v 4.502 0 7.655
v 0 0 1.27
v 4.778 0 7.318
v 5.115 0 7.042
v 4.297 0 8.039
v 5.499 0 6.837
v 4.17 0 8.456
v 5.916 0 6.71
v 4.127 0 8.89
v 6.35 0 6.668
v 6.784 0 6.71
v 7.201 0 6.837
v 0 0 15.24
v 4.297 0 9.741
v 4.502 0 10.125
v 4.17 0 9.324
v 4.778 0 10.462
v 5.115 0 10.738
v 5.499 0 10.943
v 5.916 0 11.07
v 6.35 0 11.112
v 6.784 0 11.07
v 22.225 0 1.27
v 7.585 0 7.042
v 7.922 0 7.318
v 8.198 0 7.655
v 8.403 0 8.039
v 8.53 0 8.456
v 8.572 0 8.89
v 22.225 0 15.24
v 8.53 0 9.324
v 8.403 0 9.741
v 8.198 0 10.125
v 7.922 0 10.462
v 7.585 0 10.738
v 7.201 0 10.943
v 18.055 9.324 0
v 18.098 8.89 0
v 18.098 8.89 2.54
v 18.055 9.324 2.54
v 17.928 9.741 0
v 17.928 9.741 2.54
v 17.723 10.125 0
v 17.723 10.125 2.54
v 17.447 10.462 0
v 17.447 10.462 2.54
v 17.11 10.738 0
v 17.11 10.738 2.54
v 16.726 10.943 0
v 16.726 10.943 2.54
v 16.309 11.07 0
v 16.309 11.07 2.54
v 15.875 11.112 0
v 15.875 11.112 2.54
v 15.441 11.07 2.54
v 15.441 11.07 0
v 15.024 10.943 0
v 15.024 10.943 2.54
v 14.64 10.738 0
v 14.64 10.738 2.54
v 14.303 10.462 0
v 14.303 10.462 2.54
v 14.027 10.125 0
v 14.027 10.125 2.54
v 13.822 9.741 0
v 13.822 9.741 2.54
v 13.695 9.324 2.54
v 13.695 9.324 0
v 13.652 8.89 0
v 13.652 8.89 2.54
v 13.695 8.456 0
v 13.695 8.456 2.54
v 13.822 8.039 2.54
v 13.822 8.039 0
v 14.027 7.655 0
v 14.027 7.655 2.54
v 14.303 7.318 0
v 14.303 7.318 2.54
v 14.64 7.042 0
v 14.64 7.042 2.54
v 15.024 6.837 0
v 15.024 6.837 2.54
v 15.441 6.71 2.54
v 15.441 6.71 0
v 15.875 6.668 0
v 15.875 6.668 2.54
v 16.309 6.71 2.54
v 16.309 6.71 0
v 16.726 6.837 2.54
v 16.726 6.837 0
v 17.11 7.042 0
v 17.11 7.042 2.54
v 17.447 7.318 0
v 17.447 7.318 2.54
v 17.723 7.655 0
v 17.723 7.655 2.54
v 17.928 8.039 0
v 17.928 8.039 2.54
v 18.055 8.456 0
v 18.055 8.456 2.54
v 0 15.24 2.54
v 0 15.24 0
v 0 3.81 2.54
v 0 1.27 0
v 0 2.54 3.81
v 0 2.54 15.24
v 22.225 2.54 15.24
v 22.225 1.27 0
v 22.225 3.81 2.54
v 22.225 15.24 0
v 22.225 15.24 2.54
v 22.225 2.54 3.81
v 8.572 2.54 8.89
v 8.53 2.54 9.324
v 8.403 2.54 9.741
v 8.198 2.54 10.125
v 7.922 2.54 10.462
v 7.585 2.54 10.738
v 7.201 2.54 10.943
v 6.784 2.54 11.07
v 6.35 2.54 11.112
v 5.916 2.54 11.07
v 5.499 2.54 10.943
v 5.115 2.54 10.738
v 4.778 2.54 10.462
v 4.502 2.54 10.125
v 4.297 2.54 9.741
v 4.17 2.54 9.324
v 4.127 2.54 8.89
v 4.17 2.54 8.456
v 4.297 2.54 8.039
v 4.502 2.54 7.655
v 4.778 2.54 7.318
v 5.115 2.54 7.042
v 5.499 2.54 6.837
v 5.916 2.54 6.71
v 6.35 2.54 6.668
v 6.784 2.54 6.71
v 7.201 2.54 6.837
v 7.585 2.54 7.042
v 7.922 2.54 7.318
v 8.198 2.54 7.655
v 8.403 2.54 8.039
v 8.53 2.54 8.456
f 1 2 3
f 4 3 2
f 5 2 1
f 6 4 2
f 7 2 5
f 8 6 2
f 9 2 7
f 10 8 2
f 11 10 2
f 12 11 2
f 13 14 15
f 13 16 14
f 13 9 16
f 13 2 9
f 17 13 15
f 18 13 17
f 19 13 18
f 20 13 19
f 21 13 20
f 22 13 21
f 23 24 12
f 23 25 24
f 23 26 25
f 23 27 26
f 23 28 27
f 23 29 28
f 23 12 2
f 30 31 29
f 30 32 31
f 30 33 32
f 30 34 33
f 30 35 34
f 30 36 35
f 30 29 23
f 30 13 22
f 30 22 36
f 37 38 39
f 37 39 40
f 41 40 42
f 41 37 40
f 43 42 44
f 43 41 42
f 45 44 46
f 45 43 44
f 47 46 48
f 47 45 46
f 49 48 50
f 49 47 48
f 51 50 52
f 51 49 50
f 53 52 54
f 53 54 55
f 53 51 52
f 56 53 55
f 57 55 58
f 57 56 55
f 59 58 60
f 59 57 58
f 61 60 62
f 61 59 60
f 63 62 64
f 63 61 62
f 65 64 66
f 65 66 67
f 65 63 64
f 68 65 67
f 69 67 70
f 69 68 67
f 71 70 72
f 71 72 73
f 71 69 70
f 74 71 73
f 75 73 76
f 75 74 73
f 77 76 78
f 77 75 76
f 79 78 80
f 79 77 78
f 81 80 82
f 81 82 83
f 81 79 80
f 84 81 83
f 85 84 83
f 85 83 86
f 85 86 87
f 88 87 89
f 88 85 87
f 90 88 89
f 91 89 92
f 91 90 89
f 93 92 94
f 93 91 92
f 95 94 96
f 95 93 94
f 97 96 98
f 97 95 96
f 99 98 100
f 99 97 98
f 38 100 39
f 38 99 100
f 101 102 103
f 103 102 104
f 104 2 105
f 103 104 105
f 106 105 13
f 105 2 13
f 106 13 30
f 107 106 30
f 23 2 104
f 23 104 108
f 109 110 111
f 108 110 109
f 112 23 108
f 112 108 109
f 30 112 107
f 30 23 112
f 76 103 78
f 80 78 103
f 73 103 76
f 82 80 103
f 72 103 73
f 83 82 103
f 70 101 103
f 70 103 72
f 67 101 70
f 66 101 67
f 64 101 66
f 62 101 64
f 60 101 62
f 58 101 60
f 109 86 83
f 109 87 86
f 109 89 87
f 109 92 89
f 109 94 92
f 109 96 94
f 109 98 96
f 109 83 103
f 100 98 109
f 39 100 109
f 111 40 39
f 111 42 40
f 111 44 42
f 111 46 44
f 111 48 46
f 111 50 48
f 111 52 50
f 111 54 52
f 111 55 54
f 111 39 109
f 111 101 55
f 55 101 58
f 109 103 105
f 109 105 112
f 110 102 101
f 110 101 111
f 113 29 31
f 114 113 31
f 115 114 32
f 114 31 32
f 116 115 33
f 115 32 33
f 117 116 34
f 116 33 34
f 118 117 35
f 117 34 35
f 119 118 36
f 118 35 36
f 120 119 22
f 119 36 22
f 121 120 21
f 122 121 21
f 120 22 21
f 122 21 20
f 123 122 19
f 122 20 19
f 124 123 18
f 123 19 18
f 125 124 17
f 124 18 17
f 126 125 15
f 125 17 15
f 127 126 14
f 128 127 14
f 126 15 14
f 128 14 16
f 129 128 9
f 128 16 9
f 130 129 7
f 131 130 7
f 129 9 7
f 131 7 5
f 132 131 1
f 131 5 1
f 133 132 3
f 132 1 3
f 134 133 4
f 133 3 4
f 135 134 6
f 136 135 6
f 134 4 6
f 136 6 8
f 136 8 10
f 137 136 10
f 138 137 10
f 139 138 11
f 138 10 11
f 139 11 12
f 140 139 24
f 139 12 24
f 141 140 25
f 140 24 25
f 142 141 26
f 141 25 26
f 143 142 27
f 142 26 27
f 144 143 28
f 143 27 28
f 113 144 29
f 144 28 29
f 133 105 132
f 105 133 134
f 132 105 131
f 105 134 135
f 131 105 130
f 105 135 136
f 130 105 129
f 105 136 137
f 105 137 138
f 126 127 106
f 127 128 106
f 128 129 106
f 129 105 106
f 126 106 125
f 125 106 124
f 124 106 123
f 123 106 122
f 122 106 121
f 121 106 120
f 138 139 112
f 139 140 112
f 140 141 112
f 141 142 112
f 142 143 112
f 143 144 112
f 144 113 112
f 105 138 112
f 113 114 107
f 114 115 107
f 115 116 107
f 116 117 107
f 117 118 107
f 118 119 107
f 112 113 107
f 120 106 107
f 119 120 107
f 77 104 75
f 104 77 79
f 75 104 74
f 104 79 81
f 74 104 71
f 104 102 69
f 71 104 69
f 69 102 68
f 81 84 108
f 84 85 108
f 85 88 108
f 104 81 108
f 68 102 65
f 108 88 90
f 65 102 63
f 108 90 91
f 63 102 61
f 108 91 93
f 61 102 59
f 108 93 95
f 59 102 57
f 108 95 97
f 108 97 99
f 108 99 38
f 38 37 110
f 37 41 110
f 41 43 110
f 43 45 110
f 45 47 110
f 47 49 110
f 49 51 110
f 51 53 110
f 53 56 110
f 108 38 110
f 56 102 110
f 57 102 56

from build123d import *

# Parameters (mm, degrees)
F0_W     = 22.225
F0_H     = 15.24
F0_R     = 2.2225
F1_DEPTH = 2.54
F2_W     = 22.225
F2_H     = 12.7
F2_R     = 2.2225
F3_DEPTH = 2.54
F4_SIZE  = 1.27
F5_SIZE  = 1.27


with BuildPart() as f1:
    # F0 (on Top) → F1 (new body)
    with BuildSketch(Plane.XY):
        with Locations((11.1125, 7.62)):
            Rectangle(F0_W, F0_H)
        with Locations((15.875, 8.89)):
            Circle(F0_R, mode=Mode.SUBTRACT)
    extrude(amount=F1_DEPTH)

    # F2 (on face) → F3 (join)
    with BuildSketch(Plane.XZ):
        with Locations((11.1125, 8.89)):
            Rectangle(F2_W, F2_H)
        with Locations((6.35, 8.89)):
            Circle(F2_R, mode=Mode.SUBTRACT)
    extrude(amount=-F3_DEPTH)

    # F4
    f4_edges = [f1.edges().sort_by_distance(p)[0] for p in [
        (11.1125, 0, 0),
    ]]
    chamfer(f4_edges, length=F4_SIZE)

    # F5
    f5_edges = [f1.edges().sort_by_distance(p)[0] for p in [
        (11.1125, 2.54, 2.54),
    ]]
    chamfer(f5_edges, length=F5_SIZE)


solid = f1.part
